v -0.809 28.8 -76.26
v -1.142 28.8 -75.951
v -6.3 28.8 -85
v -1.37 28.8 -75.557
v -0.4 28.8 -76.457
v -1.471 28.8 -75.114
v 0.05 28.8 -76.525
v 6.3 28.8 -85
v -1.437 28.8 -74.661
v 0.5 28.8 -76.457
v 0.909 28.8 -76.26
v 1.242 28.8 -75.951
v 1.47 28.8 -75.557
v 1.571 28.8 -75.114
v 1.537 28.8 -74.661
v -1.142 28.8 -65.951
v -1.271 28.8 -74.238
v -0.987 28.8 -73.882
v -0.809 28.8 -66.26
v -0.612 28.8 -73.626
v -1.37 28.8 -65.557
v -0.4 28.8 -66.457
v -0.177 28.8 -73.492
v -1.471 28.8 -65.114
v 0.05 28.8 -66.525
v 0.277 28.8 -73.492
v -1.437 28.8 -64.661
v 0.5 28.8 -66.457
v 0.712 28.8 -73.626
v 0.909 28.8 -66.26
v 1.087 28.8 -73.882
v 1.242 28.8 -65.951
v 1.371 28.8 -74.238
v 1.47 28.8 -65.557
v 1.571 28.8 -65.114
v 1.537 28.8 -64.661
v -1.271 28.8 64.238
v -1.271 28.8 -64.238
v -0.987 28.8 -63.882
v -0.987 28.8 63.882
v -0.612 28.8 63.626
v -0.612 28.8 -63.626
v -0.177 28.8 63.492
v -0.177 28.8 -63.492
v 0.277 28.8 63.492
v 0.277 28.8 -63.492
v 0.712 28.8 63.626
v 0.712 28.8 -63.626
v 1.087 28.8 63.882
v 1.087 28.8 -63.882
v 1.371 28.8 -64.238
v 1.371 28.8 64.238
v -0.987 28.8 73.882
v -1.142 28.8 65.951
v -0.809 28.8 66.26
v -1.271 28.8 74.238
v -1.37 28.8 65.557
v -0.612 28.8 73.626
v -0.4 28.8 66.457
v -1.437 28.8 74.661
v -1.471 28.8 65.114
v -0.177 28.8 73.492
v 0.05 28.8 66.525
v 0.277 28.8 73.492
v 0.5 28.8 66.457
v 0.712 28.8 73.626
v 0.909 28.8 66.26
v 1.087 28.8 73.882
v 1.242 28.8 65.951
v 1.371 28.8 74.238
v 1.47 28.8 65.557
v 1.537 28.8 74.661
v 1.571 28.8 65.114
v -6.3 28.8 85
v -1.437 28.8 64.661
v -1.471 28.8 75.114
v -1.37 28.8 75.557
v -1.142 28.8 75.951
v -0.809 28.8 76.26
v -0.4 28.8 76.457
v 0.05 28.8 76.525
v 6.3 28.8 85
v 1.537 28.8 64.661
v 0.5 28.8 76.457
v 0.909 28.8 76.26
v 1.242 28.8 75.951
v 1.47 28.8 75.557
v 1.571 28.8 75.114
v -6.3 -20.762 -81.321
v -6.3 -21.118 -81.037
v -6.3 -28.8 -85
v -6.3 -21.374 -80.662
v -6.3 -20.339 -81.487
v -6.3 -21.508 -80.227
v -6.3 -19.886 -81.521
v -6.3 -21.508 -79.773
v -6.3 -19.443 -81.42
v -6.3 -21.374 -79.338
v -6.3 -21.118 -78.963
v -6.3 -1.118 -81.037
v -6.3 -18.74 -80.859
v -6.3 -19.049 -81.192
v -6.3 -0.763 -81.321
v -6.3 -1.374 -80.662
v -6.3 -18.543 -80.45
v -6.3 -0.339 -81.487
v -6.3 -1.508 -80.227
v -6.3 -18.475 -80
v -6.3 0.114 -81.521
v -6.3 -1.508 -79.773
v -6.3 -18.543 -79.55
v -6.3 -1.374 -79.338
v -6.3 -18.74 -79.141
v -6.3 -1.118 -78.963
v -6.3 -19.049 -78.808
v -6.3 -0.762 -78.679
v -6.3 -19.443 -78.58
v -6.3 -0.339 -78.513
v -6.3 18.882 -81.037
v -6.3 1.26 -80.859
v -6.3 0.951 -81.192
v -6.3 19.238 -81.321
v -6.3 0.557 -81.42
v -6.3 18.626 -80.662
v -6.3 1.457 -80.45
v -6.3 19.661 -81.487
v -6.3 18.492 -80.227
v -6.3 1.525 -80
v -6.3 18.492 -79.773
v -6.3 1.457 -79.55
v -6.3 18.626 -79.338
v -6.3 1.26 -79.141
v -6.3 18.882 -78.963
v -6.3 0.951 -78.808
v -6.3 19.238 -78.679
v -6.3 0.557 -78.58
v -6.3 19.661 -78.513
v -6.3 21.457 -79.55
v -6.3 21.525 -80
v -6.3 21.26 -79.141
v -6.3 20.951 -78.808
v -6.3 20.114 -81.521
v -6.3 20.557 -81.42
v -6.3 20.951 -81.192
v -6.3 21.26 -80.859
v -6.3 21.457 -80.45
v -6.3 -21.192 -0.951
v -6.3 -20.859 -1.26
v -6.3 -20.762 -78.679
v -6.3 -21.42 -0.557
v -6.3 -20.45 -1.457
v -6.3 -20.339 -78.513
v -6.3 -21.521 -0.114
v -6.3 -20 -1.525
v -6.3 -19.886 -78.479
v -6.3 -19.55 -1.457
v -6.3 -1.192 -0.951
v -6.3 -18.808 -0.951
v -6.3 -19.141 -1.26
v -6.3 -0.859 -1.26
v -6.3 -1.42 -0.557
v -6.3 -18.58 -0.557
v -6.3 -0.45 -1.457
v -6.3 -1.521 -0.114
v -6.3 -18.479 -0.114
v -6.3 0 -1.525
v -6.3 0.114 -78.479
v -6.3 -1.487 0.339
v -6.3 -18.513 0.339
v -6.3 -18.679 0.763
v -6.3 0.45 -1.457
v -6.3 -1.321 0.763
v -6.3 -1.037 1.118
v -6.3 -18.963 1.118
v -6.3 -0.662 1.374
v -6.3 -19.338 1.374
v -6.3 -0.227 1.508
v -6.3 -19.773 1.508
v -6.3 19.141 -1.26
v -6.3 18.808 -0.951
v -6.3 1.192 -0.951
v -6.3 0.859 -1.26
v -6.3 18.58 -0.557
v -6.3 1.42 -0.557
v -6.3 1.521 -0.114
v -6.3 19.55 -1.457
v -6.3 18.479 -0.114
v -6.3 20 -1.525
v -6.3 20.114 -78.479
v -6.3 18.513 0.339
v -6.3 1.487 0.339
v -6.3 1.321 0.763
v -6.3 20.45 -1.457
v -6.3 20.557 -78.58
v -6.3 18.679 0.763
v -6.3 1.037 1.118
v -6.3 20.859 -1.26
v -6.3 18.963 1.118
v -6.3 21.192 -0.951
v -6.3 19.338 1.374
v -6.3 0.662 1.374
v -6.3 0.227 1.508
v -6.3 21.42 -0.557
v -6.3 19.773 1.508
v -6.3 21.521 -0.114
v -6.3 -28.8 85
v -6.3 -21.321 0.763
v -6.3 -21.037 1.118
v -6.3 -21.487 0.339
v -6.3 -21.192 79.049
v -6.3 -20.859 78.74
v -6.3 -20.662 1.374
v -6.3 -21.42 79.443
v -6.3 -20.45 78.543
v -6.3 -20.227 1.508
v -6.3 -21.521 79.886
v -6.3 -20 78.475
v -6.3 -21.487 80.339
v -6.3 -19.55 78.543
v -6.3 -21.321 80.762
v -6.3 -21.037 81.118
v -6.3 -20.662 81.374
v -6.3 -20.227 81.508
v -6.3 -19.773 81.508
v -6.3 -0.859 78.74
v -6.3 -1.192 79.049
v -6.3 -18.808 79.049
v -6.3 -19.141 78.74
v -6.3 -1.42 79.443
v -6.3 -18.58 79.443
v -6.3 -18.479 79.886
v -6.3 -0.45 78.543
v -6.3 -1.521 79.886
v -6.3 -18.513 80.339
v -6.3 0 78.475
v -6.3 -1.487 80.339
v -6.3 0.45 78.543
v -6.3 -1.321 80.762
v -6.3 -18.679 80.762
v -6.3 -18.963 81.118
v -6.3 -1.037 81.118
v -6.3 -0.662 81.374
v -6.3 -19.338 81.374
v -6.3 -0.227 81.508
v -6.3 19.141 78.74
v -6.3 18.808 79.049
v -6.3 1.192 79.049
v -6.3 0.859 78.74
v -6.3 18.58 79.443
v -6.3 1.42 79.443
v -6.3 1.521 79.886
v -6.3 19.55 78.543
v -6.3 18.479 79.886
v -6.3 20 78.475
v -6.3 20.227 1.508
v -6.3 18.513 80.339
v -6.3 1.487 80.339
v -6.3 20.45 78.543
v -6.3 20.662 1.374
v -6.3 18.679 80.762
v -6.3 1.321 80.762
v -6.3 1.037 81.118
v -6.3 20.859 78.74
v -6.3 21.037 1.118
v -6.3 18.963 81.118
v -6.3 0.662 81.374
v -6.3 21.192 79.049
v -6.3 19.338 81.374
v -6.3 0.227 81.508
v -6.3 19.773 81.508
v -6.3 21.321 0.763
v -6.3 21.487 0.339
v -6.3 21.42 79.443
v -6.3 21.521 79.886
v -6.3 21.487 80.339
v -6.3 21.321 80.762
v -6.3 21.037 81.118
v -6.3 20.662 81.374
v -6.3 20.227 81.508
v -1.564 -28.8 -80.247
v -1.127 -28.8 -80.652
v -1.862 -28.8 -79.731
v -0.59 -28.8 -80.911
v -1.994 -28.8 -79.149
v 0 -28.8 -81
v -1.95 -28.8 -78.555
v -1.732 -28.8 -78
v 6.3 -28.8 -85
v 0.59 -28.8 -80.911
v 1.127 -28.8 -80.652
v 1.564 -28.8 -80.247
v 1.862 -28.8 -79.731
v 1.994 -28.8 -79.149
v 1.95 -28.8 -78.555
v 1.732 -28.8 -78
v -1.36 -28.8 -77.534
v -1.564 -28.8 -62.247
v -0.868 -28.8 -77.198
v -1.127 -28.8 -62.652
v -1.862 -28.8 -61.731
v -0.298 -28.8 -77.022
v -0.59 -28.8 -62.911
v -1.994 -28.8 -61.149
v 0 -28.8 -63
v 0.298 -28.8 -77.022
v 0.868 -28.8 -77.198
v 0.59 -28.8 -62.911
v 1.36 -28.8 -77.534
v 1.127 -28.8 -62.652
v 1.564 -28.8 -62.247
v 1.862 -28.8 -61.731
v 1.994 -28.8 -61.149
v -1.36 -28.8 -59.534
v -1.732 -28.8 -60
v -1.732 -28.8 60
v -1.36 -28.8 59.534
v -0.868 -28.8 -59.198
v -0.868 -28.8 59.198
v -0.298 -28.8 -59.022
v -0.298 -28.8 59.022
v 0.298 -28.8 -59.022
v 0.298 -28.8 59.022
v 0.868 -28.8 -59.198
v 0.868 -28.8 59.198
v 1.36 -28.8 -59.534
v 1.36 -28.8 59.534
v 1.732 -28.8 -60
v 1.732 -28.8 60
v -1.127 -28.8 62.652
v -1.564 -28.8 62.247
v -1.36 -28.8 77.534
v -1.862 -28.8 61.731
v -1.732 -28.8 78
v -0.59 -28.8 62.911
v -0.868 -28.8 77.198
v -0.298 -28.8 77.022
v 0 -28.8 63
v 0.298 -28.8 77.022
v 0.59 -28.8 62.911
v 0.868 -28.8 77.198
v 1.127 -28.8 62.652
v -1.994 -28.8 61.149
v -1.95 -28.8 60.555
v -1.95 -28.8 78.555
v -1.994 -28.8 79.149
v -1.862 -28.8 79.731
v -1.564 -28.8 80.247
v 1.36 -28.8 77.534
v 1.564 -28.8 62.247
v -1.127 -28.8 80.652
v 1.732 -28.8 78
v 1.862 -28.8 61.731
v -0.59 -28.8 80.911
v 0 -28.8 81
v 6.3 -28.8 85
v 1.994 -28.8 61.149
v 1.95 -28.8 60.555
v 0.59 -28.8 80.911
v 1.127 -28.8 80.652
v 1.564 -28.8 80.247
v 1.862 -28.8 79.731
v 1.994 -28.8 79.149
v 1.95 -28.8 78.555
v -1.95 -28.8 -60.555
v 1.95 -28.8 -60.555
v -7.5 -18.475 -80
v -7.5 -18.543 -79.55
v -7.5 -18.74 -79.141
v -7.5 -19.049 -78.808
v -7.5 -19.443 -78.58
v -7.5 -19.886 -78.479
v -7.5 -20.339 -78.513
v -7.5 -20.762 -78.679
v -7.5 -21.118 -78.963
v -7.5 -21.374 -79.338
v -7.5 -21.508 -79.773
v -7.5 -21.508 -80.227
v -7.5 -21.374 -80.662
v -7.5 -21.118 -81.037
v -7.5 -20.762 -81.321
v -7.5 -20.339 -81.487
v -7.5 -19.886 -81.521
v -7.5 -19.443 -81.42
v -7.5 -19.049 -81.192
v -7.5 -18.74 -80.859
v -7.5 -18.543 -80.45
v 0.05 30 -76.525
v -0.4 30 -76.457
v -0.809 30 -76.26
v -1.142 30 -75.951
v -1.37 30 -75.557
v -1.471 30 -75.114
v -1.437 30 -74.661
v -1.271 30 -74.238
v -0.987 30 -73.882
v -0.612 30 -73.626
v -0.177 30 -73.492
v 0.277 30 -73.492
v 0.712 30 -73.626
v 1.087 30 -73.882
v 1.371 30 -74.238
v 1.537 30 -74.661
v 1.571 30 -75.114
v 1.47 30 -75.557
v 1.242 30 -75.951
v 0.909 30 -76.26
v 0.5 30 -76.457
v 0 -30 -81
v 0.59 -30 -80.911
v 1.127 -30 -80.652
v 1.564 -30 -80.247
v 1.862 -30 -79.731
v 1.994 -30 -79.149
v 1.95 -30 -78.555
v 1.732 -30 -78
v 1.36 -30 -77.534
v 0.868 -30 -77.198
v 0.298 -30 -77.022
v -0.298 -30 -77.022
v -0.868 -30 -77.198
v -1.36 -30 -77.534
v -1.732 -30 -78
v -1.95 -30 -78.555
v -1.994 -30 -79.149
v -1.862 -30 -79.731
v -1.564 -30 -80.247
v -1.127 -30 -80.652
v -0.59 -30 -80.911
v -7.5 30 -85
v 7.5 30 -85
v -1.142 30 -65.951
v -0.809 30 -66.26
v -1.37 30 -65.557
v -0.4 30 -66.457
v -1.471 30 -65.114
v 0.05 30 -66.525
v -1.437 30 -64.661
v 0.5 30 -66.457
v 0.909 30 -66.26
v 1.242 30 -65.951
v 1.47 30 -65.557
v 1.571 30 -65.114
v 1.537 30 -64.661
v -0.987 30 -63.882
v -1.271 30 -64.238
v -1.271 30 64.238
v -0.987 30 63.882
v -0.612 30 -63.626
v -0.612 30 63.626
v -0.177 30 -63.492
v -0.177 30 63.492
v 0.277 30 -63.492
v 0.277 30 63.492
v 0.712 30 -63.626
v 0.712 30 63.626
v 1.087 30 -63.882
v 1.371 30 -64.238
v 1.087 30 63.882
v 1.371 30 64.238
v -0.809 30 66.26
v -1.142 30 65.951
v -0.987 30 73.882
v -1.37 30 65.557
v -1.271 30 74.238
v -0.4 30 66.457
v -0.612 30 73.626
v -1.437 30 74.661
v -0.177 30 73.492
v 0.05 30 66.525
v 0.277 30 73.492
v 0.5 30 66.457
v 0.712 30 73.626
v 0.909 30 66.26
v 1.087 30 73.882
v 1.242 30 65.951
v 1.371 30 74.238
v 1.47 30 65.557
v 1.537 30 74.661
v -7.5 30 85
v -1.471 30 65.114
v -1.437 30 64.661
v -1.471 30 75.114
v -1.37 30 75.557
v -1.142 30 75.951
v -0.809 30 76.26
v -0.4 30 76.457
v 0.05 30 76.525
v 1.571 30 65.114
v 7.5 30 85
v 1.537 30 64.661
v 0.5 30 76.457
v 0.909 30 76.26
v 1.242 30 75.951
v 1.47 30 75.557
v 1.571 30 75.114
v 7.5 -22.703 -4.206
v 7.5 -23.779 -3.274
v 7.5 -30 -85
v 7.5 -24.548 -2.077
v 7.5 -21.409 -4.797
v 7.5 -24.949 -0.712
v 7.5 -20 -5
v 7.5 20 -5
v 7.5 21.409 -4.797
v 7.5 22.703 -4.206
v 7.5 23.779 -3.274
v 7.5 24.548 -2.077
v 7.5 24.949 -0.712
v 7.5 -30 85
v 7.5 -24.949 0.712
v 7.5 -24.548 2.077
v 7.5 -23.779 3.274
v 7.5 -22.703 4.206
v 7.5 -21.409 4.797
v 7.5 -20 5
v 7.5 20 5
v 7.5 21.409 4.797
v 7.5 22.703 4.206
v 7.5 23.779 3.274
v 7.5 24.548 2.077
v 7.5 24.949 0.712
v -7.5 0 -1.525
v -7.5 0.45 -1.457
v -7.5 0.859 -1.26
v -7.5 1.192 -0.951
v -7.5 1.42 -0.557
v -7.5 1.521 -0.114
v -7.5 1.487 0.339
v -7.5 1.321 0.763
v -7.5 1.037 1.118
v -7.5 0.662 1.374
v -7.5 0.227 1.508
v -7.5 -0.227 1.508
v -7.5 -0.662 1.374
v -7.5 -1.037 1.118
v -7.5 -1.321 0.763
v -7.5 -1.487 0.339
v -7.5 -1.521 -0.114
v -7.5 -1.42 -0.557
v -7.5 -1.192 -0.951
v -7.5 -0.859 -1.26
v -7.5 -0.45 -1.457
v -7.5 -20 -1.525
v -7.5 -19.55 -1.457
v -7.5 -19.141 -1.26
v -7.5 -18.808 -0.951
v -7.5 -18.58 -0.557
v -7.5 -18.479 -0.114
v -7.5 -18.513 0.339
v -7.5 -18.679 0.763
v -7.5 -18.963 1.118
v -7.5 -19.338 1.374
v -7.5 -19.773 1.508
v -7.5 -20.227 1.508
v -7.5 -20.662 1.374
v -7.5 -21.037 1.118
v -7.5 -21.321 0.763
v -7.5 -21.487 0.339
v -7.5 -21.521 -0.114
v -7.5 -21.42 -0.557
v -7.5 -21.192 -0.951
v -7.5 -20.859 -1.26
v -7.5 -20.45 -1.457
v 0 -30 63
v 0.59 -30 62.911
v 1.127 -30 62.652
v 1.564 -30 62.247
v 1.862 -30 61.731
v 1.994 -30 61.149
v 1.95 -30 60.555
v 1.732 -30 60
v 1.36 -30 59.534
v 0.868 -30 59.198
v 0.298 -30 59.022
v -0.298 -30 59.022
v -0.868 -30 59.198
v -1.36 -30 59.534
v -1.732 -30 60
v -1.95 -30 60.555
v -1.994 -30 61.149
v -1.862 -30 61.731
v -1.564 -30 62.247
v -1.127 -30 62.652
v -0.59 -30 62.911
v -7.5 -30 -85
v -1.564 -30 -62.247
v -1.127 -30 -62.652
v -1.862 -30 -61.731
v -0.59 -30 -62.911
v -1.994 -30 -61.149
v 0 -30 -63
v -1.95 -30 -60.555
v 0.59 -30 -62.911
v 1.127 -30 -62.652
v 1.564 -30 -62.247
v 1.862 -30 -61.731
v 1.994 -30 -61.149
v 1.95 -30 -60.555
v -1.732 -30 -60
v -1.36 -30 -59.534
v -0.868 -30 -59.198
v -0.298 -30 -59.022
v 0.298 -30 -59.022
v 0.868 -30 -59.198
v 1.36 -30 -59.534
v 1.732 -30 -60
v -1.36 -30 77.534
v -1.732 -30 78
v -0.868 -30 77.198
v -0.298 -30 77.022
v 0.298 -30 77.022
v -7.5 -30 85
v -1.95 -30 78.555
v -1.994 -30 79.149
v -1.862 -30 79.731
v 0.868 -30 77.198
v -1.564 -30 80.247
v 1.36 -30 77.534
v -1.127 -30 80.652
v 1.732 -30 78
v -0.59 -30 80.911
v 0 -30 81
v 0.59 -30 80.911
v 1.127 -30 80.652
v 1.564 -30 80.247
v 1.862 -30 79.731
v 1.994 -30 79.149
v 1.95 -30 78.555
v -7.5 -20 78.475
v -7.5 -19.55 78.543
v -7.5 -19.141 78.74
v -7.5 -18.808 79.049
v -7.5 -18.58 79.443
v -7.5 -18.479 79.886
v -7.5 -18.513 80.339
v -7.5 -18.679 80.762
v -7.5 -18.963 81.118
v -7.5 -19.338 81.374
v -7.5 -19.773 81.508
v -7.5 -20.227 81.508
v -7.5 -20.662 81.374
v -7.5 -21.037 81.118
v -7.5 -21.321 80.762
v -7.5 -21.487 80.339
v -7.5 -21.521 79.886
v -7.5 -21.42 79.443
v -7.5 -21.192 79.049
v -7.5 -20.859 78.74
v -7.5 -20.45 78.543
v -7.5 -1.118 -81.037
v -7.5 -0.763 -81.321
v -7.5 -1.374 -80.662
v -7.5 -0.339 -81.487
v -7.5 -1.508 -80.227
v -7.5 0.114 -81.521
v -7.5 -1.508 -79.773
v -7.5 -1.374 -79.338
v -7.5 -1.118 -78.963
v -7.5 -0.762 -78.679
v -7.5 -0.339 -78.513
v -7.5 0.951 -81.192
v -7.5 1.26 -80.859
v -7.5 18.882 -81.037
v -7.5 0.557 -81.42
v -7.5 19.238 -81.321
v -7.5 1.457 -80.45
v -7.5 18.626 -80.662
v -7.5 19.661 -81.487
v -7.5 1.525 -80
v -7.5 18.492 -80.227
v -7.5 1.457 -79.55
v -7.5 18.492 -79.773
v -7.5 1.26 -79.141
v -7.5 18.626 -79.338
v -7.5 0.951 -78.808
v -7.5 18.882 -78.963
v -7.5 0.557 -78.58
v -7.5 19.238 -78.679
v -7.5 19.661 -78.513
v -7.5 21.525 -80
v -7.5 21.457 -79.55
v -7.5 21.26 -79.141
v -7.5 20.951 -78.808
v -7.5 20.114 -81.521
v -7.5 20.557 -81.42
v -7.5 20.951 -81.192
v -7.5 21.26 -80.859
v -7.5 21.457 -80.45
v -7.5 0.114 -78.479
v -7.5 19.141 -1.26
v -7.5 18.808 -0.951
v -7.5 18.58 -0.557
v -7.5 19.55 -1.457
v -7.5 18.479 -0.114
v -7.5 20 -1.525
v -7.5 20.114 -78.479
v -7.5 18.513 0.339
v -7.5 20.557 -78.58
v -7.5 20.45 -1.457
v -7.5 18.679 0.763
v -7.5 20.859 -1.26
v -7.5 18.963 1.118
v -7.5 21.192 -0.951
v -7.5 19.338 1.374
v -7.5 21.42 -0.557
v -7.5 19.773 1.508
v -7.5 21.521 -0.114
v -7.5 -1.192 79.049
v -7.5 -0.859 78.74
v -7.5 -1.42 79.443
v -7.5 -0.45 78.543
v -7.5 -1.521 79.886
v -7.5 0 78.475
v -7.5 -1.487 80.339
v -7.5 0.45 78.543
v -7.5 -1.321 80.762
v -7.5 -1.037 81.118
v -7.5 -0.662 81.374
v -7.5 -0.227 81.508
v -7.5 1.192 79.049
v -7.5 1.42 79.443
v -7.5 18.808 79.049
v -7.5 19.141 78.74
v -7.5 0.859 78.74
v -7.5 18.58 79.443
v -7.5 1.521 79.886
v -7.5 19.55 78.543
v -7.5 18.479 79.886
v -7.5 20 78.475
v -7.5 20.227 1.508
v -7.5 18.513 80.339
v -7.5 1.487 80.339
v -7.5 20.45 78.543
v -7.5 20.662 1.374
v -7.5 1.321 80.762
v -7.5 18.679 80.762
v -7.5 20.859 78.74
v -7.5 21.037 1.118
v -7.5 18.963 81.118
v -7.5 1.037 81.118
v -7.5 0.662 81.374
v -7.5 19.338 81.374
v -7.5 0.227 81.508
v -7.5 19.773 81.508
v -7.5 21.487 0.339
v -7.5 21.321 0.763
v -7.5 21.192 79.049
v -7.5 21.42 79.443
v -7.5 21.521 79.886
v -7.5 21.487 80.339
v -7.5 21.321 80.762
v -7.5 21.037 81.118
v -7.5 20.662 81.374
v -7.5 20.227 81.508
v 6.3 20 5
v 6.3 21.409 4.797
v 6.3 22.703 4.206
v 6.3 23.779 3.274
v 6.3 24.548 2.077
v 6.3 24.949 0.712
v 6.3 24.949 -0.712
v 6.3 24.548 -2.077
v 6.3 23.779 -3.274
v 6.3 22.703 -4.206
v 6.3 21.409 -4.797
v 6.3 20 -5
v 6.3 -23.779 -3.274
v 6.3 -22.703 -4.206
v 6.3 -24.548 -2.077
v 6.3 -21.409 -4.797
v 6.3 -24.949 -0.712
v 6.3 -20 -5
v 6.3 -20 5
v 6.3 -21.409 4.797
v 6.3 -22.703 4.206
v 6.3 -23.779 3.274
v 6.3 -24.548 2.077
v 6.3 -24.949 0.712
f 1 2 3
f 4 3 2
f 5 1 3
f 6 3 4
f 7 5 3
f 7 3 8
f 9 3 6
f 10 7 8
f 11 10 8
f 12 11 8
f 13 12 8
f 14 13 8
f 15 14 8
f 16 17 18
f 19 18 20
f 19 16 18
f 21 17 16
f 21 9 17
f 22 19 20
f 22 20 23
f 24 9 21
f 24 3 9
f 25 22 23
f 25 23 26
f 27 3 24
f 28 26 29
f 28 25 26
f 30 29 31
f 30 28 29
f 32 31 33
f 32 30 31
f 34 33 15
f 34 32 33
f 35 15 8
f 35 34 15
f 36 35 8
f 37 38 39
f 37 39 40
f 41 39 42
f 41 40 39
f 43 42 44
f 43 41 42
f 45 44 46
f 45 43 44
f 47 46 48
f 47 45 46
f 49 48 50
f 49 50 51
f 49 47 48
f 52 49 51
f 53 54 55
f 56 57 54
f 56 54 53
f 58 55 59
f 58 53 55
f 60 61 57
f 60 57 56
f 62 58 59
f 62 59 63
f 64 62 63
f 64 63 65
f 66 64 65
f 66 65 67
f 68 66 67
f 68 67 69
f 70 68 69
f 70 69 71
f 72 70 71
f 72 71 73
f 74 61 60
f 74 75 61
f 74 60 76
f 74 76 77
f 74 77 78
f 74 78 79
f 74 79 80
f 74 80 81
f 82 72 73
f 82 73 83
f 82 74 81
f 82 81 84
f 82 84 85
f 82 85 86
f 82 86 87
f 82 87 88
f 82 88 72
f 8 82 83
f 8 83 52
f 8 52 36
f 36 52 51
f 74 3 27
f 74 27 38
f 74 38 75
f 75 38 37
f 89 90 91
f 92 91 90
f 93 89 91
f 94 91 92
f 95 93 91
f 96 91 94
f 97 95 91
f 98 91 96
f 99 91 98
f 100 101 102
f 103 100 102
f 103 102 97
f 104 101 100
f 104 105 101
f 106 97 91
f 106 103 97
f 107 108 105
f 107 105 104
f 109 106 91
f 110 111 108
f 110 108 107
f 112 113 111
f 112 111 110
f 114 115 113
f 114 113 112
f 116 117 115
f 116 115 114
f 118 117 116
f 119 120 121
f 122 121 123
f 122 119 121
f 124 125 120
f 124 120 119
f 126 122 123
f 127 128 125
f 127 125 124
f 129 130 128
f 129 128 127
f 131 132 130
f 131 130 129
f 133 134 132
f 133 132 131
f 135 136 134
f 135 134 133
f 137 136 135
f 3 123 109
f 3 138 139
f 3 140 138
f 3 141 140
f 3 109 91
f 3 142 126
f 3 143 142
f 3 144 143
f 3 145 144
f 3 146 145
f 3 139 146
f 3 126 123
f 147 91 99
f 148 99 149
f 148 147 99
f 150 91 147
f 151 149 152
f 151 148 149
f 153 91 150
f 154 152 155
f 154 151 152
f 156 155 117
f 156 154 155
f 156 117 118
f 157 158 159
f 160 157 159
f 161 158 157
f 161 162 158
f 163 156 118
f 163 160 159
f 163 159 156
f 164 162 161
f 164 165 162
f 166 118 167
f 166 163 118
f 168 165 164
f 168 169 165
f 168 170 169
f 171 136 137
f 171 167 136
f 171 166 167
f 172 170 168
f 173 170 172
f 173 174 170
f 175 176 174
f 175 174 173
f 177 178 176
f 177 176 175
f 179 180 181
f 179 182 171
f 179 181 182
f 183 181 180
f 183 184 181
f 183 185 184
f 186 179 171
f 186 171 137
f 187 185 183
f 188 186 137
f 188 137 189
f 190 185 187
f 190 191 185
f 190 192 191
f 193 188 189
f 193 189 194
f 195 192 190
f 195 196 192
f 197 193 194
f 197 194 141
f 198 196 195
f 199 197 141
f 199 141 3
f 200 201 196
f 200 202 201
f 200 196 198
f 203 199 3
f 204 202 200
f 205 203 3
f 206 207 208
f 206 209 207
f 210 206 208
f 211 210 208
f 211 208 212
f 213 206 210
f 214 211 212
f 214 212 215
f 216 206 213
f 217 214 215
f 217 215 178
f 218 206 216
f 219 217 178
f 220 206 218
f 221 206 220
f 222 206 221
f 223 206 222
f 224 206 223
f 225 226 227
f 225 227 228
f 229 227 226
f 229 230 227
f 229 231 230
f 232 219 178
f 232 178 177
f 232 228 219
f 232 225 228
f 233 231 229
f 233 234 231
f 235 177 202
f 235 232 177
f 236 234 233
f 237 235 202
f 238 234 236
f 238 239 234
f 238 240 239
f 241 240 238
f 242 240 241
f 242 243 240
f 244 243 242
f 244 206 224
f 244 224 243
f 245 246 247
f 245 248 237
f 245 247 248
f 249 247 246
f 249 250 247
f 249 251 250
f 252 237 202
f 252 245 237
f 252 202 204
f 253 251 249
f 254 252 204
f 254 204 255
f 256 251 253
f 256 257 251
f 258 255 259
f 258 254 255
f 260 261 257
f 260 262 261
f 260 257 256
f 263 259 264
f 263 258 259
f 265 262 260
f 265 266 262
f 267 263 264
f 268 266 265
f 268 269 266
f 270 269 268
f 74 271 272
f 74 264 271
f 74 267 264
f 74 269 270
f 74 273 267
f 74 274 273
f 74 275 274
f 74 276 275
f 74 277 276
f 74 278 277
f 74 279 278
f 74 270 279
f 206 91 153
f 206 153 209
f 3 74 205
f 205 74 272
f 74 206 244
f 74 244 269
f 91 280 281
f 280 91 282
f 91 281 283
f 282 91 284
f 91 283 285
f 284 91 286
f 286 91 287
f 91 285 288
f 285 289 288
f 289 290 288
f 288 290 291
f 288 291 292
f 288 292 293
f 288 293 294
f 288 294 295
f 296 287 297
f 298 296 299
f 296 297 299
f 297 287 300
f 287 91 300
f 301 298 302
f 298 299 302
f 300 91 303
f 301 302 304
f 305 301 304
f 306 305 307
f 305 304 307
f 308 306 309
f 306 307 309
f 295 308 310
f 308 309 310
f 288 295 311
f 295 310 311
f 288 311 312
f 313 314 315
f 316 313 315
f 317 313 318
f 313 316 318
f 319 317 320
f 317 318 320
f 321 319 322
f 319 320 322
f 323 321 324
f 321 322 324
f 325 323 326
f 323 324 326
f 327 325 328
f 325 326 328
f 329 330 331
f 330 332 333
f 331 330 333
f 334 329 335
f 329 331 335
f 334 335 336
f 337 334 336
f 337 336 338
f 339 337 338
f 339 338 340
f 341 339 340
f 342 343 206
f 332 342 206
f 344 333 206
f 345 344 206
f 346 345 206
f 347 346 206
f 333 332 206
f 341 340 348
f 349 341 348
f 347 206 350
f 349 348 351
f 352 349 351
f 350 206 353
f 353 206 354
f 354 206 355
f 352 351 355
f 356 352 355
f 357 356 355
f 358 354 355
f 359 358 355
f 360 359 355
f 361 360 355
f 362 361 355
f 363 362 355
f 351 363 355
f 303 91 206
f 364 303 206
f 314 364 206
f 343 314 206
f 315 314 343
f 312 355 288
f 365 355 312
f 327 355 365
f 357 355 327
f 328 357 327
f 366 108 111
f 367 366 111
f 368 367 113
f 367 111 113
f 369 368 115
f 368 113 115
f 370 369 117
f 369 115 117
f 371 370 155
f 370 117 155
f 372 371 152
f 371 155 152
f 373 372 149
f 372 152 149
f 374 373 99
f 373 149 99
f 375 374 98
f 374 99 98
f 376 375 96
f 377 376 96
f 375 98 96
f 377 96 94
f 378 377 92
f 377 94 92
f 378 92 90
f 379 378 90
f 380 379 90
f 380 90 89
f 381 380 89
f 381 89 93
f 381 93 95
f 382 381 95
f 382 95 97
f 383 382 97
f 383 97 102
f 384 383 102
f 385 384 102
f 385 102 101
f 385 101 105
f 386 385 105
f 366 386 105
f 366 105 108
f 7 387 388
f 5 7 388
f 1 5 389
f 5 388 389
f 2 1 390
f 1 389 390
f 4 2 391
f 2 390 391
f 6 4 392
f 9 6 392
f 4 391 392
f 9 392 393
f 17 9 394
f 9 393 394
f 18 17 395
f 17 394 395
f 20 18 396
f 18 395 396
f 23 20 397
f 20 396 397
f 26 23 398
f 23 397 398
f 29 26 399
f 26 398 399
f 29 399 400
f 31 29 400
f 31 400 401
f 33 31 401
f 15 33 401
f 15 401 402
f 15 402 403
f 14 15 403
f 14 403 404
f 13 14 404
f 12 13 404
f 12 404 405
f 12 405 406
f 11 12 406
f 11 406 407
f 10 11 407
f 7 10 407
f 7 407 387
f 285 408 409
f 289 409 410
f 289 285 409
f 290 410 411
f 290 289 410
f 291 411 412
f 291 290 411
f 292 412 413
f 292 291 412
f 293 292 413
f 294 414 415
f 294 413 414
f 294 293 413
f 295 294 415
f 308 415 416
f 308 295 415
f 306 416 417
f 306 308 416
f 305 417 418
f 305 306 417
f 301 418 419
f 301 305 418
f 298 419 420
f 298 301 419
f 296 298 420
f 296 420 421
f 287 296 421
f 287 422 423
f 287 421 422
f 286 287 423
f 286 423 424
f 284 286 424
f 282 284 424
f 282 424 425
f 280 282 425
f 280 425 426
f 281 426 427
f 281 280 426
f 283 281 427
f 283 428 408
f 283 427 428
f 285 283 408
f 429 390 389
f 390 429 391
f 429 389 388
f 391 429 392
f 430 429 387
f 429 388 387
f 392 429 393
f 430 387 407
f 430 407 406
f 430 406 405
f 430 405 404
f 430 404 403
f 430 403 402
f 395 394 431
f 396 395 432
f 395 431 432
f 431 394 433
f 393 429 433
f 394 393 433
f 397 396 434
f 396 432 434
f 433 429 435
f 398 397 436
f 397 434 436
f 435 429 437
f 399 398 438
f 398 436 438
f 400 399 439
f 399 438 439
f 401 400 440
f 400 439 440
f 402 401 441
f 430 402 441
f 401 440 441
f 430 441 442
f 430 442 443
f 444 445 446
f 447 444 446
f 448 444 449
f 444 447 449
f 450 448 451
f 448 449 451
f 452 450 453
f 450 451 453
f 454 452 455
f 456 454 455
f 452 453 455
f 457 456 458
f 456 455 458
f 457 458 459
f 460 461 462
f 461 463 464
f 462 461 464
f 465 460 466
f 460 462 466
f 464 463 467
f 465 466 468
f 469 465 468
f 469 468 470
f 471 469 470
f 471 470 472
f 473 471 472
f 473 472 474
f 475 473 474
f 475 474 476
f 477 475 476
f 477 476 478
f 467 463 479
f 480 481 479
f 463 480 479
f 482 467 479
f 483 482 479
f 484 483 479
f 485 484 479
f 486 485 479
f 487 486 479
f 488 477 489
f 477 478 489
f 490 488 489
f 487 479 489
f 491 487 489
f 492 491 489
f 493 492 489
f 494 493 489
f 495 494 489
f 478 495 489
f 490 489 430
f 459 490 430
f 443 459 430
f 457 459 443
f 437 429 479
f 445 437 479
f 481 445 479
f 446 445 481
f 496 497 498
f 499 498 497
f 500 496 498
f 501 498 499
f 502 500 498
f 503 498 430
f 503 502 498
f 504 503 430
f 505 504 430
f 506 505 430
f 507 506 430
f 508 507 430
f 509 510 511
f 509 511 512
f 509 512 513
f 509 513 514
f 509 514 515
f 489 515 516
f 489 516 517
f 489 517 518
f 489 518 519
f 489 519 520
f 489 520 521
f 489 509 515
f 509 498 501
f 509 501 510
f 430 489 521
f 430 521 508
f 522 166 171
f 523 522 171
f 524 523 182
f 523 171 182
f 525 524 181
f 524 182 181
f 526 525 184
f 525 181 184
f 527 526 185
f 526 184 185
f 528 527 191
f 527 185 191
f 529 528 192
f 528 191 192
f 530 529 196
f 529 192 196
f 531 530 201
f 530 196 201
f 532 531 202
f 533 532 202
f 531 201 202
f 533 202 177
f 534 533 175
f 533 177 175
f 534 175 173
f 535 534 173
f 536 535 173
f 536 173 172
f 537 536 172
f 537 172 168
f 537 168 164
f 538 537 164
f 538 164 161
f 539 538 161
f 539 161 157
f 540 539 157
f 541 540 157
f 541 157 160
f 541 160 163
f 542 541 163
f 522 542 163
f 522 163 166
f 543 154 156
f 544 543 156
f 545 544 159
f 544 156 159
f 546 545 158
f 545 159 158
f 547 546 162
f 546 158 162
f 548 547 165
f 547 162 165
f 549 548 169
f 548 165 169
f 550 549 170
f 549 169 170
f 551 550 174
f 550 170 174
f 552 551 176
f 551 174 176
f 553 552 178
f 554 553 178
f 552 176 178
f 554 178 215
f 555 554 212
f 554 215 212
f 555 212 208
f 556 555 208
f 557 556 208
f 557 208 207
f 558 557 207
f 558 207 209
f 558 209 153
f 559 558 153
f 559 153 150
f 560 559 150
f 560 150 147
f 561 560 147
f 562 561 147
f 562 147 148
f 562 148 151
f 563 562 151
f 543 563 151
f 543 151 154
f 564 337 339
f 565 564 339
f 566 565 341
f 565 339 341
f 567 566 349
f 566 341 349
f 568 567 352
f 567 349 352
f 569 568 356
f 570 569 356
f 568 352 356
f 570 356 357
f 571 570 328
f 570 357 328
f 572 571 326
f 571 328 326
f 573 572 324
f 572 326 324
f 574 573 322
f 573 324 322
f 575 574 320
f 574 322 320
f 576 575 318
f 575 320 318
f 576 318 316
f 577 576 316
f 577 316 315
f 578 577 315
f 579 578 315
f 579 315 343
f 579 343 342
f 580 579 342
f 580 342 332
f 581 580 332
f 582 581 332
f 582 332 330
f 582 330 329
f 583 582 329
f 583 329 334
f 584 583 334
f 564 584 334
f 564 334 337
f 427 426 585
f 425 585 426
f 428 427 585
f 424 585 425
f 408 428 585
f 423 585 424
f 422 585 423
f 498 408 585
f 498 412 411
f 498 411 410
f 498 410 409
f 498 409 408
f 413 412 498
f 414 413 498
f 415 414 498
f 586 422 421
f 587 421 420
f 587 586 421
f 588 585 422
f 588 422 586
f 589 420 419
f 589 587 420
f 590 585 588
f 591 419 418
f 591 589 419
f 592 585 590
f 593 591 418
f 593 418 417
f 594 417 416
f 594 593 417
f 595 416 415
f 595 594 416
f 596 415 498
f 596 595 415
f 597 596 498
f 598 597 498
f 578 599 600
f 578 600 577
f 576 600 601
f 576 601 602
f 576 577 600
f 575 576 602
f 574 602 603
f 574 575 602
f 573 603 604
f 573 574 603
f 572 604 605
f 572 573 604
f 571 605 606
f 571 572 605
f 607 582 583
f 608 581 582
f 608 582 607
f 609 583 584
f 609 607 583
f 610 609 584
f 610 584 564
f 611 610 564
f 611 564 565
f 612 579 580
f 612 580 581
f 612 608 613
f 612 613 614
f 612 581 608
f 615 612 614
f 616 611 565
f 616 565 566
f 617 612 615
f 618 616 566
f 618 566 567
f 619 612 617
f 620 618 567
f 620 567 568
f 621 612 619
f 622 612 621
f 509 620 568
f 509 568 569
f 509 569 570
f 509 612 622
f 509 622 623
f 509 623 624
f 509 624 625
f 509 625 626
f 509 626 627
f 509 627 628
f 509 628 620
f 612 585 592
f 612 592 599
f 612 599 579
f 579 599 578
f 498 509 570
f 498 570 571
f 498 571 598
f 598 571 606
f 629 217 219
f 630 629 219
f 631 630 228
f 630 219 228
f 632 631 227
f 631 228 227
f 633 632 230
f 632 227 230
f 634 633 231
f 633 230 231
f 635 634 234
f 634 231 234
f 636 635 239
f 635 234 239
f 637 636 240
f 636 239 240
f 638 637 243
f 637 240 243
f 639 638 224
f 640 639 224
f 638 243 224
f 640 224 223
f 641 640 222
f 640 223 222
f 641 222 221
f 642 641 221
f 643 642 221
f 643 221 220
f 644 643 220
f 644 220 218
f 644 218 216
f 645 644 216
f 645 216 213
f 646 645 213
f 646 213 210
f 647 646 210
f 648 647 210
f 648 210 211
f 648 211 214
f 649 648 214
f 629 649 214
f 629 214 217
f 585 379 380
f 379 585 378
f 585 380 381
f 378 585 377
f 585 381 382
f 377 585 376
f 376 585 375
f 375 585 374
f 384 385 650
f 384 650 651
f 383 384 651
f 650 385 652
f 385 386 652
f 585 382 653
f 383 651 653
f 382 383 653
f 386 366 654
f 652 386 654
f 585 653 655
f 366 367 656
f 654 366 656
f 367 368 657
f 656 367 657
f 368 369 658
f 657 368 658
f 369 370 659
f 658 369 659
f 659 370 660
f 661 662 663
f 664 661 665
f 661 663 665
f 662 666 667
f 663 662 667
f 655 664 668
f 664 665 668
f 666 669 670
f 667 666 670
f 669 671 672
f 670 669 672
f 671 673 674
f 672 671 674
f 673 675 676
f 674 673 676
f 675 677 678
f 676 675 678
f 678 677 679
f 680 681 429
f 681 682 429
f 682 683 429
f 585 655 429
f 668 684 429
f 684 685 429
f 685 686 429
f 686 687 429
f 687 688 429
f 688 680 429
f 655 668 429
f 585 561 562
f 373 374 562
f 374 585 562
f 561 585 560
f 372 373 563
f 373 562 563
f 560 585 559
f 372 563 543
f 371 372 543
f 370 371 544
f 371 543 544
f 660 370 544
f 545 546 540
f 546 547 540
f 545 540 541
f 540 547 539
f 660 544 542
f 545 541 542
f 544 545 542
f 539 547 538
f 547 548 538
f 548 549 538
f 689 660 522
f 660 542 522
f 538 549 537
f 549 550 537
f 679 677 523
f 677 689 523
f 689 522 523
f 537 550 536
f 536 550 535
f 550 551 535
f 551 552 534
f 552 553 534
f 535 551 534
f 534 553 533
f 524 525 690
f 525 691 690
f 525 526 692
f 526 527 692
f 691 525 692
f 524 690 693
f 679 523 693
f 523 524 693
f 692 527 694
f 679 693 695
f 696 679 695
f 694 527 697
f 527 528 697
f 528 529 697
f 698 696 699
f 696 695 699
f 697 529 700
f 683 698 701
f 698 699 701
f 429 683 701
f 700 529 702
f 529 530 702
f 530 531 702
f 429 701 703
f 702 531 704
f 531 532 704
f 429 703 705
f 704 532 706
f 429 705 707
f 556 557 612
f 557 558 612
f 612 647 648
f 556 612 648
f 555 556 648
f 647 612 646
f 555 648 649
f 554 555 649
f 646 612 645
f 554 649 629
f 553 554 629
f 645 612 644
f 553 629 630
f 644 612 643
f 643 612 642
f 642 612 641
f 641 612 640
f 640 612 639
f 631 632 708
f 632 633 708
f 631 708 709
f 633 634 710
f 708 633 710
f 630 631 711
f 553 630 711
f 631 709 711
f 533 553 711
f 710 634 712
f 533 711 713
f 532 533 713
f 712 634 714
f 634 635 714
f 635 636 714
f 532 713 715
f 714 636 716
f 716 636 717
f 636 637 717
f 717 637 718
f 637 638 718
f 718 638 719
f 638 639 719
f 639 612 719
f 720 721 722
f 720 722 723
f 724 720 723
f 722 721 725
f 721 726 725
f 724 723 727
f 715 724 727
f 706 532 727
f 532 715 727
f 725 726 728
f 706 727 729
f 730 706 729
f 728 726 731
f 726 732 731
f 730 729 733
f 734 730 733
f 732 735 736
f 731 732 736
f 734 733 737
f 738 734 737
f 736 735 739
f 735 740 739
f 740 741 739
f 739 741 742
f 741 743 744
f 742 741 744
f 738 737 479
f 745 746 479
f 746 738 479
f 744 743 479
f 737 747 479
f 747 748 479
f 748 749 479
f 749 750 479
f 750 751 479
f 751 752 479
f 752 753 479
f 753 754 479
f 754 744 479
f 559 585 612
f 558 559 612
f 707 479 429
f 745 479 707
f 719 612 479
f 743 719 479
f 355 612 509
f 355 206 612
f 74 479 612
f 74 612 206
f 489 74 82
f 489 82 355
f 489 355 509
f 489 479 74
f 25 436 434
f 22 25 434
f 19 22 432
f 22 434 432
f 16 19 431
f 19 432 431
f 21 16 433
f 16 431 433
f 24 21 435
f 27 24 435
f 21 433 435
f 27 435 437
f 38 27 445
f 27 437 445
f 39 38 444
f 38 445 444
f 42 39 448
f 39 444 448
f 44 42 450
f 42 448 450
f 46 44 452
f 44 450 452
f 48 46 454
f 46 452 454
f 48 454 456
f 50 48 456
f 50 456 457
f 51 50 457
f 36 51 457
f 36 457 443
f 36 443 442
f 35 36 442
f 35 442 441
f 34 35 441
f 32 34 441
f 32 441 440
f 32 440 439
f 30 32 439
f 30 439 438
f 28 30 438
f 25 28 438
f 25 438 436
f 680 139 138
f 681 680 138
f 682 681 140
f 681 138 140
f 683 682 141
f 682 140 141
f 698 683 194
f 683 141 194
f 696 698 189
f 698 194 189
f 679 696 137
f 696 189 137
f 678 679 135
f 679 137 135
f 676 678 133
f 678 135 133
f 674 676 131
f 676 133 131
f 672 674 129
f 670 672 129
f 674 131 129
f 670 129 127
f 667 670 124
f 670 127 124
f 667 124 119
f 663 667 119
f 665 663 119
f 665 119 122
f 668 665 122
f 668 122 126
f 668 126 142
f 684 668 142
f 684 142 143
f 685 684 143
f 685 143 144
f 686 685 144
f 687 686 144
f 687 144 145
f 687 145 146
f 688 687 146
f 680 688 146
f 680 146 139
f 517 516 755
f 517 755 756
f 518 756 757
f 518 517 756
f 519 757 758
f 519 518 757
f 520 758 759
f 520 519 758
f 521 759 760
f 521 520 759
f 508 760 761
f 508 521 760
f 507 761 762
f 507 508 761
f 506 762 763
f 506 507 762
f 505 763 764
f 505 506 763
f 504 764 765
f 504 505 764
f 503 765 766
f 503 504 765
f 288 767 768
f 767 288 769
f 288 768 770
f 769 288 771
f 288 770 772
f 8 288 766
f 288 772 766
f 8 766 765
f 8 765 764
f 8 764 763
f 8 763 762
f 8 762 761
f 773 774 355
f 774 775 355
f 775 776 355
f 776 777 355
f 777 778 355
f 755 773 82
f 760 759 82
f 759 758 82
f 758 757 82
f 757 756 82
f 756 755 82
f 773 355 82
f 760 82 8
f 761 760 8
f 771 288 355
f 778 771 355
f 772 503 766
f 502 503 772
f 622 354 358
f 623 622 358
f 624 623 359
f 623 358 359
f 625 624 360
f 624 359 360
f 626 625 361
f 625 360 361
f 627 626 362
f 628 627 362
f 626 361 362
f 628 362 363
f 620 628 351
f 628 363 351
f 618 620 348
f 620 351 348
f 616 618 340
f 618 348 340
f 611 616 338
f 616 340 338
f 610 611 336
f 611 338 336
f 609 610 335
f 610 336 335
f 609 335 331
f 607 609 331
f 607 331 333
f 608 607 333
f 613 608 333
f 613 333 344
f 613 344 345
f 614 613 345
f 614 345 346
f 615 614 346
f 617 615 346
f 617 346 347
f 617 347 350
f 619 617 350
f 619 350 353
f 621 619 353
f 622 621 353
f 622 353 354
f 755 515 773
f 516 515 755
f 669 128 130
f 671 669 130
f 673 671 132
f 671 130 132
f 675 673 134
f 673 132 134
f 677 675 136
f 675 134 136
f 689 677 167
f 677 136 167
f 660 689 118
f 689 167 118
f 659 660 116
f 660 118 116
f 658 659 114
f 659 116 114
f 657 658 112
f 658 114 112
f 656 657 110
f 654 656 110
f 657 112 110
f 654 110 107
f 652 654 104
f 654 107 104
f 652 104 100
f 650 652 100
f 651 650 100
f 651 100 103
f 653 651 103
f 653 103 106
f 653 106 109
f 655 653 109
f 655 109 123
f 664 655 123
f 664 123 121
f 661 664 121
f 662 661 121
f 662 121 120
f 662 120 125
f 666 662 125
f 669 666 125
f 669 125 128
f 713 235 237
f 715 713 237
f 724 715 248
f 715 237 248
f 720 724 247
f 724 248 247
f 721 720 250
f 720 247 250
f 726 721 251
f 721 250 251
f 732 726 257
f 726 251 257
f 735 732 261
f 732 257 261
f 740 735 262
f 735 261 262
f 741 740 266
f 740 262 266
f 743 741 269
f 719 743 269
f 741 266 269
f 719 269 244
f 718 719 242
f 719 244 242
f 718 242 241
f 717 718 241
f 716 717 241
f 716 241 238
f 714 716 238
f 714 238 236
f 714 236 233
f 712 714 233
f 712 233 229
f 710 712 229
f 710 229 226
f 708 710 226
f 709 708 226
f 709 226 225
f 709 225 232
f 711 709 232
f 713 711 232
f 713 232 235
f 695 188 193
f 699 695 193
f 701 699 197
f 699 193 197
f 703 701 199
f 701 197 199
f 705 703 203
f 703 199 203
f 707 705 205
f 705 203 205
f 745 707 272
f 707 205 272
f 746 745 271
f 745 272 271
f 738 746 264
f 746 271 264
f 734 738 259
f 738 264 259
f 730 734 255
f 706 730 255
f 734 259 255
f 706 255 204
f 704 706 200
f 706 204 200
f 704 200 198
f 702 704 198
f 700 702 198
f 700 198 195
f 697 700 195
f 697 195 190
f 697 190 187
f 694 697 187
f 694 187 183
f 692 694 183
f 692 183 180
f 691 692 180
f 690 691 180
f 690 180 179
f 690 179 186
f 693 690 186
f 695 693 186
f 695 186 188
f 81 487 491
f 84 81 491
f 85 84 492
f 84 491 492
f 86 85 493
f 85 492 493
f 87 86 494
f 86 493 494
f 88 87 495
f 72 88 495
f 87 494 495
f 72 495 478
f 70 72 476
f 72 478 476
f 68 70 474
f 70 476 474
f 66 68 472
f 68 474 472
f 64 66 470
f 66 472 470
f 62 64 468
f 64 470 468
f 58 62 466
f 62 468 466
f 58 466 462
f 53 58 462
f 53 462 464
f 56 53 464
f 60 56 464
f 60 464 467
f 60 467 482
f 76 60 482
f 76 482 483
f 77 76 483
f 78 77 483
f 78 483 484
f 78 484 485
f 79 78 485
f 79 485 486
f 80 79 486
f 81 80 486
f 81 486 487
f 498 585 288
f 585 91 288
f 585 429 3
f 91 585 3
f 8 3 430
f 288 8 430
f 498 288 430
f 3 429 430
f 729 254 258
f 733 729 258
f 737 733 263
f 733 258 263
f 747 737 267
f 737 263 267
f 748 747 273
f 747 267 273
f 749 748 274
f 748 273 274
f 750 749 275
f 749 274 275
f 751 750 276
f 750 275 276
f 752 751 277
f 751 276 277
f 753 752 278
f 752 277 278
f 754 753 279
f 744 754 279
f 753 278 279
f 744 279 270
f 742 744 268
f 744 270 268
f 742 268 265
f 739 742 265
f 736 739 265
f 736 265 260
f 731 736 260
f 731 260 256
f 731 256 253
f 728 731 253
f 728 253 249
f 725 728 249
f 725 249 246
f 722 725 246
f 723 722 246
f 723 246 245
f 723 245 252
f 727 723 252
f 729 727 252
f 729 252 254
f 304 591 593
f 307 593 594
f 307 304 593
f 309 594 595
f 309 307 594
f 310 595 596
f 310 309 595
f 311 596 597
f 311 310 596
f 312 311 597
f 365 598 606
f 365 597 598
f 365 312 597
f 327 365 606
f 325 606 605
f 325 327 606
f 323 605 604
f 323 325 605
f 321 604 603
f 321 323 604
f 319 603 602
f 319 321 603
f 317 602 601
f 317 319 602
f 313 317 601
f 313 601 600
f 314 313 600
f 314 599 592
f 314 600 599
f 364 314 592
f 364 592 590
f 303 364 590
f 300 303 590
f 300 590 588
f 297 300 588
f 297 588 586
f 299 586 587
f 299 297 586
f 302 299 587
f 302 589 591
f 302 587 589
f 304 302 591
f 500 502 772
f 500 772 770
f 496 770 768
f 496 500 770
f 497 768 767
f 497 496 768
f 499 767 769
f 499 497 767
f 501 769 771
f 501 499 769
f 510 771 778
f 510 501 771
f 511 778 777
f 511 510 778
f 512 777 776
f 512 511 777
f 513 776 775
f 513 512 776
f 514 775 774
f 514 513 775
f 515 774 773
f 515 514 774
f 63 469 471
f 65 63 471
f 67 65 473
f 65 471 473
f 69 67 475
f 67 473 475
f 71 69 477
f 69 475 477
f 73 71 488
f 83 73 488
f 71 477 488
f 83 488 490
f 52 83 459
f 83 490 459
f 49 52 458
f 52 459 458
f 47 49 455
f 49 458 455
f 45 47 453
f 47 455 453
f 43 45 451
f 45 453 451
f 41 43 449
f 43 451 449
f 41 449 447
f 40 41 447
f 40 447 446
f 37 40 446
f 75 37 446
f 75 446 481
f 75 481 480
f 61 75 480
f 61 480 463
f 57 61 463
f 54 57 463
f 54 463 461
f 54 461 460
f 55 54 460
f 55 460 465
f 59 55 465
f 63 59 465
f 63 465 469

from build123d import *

# Parameters (mm, degrees)
SKETCH_1_W          = 15
SKETCH_1_H          = 60
SKETCH_1_W_2        = 12.6
SKETCH_1_H_2        = 57.6
EXTRUDE_1_DEPTH     = 85
SKETCH_2_R          = 2
CUT_EXTRUDE_1_DEPTH = 10
SKETCH_3_R          = 1.525
CUT_EXTRUDE_2_DEPTH = 10
SKETCH_4_R          = 1.525
CUT_EXTRUDE_3_DEPTH = 10
CUT_EXTRUDE_4_DEPTH = 10


with BuildPart() as part:
    # 草图1 → 凸台-拉伸1 (new, symmetric)
    with BuildSketch(Plane.XY):
        Rectangle(SKETCH_1_W, SKETCH_1_H)
        Rectangle(SKETCH_1_W_2, SKETCH_1_H_2, mode=Mode.SUBTRACT)
    extrude(amount=EXTRUDE_1_DEPTH, both=True)

    # 草图2 → 切除-拉伸1 (cut)
    with BuildSketch(Plane(origin=(0, -28.8, 0), x_dir=(1, 0, 0), z_dir=(0, 1, 0))):
        with Locations(Location((0, -79, 0), (0, 0, 270))):
            Circle(SKETCH_2_R)
        with Locations(Location((0, -61, 0), (0, 0, 270))):
            Circle(SKETCH_2_R)
    cut_extrude_1 = extrude(amount=-CUT_EXTRUDE_1_DEPTH, mode=Mode.SUBTRACT)

    # 镜向1: 切除-拉伸1 across plane
    add(cut_extrude_1.mirror(Plane.XY), mode=Mode.SUBTRACT)

    # 草图3 → 切除-拉伸2 (cut)
    with BuildSketch(Plane(origin=(0, 30, 0), x_dir=(1, 0, 0), z_dir=(0, 1, 0))):
        with Locations(Location((0.05, -75, 0), (0, 0, 270))):
            Circle(SKETCH_3_R)
        with Locations(Location((0.05, -65, 0), (0, 0, 270))):
            Circle(SKETCH_3_R)
        with Locations(Location((0.05, 65, 0), (0, 0, 90))):
            Circle(SKETCH_3_R)
        with Locations(Location((0.05, 75, 0), (0, 0, 90))):
            Circle(SKETCH_3_R)
    extrude(amount=-CUT_EXTRUDE_2_DEPTH, mode=Mode.SUBTRACT)

    # 草图4 → 切除-拉伸3 (cut)
    with BuildSketch(Plane(origin=(-6.3, 0, 0), x_dir=(0, 0, -1), z_dir=(1, 0, 0))):
        with Locations((0, -20)):
            Circle(SKETCH_4_R)
        Circle(SKETCH_4_R)
        with Locations((0, 20)):
            Circle(SKETCH_4_R)
        with Locations((-80, -20)):
            Circle(SKETCH_4_R)
        with Locations((-80, 0)):
            Circle(SKETCH_4_R)
        with Locations((-80, 20)):
            Circle(SKETCH_4_R)
        with Locations(Location((80, 20, 0), (0, 0, 90))):
            Circle(SKETCH_4_R)
        with Locations(Location((80, 0, 0), (0, 0, 90))):
            Circle(SKETCH_4_R)
        with Locations(Location((80, -20, 0), (0, 0, 90))):
            Circle(SKETCH_4_R)
    extrude(amount=-CUT_EXTRUDE_3_DEPTH, mode=Mode.SUBTRACT)

    # 草图5 → 切除-拉伸4 (cut)
    with BuildSketch(Plane(origin=(7.5, 0, 0), x_dir=(0, 0, -1), z_dir=(1, 0, 0))):
        with BuildLine():
            Line((-5, -20), (-5, 20))
            ThreePointArc((-5, 20), (0, 25), (5, 20))
            Line((5, 20), (5, -20))
            ThreePointArc((5, -20), (0, -25), (-5, -20))
        make_face()
    extrude(amount=-CUT_EXTRUDE_4_DEPTH, mode=Mode.SUBTRACT)


solid = part.part
